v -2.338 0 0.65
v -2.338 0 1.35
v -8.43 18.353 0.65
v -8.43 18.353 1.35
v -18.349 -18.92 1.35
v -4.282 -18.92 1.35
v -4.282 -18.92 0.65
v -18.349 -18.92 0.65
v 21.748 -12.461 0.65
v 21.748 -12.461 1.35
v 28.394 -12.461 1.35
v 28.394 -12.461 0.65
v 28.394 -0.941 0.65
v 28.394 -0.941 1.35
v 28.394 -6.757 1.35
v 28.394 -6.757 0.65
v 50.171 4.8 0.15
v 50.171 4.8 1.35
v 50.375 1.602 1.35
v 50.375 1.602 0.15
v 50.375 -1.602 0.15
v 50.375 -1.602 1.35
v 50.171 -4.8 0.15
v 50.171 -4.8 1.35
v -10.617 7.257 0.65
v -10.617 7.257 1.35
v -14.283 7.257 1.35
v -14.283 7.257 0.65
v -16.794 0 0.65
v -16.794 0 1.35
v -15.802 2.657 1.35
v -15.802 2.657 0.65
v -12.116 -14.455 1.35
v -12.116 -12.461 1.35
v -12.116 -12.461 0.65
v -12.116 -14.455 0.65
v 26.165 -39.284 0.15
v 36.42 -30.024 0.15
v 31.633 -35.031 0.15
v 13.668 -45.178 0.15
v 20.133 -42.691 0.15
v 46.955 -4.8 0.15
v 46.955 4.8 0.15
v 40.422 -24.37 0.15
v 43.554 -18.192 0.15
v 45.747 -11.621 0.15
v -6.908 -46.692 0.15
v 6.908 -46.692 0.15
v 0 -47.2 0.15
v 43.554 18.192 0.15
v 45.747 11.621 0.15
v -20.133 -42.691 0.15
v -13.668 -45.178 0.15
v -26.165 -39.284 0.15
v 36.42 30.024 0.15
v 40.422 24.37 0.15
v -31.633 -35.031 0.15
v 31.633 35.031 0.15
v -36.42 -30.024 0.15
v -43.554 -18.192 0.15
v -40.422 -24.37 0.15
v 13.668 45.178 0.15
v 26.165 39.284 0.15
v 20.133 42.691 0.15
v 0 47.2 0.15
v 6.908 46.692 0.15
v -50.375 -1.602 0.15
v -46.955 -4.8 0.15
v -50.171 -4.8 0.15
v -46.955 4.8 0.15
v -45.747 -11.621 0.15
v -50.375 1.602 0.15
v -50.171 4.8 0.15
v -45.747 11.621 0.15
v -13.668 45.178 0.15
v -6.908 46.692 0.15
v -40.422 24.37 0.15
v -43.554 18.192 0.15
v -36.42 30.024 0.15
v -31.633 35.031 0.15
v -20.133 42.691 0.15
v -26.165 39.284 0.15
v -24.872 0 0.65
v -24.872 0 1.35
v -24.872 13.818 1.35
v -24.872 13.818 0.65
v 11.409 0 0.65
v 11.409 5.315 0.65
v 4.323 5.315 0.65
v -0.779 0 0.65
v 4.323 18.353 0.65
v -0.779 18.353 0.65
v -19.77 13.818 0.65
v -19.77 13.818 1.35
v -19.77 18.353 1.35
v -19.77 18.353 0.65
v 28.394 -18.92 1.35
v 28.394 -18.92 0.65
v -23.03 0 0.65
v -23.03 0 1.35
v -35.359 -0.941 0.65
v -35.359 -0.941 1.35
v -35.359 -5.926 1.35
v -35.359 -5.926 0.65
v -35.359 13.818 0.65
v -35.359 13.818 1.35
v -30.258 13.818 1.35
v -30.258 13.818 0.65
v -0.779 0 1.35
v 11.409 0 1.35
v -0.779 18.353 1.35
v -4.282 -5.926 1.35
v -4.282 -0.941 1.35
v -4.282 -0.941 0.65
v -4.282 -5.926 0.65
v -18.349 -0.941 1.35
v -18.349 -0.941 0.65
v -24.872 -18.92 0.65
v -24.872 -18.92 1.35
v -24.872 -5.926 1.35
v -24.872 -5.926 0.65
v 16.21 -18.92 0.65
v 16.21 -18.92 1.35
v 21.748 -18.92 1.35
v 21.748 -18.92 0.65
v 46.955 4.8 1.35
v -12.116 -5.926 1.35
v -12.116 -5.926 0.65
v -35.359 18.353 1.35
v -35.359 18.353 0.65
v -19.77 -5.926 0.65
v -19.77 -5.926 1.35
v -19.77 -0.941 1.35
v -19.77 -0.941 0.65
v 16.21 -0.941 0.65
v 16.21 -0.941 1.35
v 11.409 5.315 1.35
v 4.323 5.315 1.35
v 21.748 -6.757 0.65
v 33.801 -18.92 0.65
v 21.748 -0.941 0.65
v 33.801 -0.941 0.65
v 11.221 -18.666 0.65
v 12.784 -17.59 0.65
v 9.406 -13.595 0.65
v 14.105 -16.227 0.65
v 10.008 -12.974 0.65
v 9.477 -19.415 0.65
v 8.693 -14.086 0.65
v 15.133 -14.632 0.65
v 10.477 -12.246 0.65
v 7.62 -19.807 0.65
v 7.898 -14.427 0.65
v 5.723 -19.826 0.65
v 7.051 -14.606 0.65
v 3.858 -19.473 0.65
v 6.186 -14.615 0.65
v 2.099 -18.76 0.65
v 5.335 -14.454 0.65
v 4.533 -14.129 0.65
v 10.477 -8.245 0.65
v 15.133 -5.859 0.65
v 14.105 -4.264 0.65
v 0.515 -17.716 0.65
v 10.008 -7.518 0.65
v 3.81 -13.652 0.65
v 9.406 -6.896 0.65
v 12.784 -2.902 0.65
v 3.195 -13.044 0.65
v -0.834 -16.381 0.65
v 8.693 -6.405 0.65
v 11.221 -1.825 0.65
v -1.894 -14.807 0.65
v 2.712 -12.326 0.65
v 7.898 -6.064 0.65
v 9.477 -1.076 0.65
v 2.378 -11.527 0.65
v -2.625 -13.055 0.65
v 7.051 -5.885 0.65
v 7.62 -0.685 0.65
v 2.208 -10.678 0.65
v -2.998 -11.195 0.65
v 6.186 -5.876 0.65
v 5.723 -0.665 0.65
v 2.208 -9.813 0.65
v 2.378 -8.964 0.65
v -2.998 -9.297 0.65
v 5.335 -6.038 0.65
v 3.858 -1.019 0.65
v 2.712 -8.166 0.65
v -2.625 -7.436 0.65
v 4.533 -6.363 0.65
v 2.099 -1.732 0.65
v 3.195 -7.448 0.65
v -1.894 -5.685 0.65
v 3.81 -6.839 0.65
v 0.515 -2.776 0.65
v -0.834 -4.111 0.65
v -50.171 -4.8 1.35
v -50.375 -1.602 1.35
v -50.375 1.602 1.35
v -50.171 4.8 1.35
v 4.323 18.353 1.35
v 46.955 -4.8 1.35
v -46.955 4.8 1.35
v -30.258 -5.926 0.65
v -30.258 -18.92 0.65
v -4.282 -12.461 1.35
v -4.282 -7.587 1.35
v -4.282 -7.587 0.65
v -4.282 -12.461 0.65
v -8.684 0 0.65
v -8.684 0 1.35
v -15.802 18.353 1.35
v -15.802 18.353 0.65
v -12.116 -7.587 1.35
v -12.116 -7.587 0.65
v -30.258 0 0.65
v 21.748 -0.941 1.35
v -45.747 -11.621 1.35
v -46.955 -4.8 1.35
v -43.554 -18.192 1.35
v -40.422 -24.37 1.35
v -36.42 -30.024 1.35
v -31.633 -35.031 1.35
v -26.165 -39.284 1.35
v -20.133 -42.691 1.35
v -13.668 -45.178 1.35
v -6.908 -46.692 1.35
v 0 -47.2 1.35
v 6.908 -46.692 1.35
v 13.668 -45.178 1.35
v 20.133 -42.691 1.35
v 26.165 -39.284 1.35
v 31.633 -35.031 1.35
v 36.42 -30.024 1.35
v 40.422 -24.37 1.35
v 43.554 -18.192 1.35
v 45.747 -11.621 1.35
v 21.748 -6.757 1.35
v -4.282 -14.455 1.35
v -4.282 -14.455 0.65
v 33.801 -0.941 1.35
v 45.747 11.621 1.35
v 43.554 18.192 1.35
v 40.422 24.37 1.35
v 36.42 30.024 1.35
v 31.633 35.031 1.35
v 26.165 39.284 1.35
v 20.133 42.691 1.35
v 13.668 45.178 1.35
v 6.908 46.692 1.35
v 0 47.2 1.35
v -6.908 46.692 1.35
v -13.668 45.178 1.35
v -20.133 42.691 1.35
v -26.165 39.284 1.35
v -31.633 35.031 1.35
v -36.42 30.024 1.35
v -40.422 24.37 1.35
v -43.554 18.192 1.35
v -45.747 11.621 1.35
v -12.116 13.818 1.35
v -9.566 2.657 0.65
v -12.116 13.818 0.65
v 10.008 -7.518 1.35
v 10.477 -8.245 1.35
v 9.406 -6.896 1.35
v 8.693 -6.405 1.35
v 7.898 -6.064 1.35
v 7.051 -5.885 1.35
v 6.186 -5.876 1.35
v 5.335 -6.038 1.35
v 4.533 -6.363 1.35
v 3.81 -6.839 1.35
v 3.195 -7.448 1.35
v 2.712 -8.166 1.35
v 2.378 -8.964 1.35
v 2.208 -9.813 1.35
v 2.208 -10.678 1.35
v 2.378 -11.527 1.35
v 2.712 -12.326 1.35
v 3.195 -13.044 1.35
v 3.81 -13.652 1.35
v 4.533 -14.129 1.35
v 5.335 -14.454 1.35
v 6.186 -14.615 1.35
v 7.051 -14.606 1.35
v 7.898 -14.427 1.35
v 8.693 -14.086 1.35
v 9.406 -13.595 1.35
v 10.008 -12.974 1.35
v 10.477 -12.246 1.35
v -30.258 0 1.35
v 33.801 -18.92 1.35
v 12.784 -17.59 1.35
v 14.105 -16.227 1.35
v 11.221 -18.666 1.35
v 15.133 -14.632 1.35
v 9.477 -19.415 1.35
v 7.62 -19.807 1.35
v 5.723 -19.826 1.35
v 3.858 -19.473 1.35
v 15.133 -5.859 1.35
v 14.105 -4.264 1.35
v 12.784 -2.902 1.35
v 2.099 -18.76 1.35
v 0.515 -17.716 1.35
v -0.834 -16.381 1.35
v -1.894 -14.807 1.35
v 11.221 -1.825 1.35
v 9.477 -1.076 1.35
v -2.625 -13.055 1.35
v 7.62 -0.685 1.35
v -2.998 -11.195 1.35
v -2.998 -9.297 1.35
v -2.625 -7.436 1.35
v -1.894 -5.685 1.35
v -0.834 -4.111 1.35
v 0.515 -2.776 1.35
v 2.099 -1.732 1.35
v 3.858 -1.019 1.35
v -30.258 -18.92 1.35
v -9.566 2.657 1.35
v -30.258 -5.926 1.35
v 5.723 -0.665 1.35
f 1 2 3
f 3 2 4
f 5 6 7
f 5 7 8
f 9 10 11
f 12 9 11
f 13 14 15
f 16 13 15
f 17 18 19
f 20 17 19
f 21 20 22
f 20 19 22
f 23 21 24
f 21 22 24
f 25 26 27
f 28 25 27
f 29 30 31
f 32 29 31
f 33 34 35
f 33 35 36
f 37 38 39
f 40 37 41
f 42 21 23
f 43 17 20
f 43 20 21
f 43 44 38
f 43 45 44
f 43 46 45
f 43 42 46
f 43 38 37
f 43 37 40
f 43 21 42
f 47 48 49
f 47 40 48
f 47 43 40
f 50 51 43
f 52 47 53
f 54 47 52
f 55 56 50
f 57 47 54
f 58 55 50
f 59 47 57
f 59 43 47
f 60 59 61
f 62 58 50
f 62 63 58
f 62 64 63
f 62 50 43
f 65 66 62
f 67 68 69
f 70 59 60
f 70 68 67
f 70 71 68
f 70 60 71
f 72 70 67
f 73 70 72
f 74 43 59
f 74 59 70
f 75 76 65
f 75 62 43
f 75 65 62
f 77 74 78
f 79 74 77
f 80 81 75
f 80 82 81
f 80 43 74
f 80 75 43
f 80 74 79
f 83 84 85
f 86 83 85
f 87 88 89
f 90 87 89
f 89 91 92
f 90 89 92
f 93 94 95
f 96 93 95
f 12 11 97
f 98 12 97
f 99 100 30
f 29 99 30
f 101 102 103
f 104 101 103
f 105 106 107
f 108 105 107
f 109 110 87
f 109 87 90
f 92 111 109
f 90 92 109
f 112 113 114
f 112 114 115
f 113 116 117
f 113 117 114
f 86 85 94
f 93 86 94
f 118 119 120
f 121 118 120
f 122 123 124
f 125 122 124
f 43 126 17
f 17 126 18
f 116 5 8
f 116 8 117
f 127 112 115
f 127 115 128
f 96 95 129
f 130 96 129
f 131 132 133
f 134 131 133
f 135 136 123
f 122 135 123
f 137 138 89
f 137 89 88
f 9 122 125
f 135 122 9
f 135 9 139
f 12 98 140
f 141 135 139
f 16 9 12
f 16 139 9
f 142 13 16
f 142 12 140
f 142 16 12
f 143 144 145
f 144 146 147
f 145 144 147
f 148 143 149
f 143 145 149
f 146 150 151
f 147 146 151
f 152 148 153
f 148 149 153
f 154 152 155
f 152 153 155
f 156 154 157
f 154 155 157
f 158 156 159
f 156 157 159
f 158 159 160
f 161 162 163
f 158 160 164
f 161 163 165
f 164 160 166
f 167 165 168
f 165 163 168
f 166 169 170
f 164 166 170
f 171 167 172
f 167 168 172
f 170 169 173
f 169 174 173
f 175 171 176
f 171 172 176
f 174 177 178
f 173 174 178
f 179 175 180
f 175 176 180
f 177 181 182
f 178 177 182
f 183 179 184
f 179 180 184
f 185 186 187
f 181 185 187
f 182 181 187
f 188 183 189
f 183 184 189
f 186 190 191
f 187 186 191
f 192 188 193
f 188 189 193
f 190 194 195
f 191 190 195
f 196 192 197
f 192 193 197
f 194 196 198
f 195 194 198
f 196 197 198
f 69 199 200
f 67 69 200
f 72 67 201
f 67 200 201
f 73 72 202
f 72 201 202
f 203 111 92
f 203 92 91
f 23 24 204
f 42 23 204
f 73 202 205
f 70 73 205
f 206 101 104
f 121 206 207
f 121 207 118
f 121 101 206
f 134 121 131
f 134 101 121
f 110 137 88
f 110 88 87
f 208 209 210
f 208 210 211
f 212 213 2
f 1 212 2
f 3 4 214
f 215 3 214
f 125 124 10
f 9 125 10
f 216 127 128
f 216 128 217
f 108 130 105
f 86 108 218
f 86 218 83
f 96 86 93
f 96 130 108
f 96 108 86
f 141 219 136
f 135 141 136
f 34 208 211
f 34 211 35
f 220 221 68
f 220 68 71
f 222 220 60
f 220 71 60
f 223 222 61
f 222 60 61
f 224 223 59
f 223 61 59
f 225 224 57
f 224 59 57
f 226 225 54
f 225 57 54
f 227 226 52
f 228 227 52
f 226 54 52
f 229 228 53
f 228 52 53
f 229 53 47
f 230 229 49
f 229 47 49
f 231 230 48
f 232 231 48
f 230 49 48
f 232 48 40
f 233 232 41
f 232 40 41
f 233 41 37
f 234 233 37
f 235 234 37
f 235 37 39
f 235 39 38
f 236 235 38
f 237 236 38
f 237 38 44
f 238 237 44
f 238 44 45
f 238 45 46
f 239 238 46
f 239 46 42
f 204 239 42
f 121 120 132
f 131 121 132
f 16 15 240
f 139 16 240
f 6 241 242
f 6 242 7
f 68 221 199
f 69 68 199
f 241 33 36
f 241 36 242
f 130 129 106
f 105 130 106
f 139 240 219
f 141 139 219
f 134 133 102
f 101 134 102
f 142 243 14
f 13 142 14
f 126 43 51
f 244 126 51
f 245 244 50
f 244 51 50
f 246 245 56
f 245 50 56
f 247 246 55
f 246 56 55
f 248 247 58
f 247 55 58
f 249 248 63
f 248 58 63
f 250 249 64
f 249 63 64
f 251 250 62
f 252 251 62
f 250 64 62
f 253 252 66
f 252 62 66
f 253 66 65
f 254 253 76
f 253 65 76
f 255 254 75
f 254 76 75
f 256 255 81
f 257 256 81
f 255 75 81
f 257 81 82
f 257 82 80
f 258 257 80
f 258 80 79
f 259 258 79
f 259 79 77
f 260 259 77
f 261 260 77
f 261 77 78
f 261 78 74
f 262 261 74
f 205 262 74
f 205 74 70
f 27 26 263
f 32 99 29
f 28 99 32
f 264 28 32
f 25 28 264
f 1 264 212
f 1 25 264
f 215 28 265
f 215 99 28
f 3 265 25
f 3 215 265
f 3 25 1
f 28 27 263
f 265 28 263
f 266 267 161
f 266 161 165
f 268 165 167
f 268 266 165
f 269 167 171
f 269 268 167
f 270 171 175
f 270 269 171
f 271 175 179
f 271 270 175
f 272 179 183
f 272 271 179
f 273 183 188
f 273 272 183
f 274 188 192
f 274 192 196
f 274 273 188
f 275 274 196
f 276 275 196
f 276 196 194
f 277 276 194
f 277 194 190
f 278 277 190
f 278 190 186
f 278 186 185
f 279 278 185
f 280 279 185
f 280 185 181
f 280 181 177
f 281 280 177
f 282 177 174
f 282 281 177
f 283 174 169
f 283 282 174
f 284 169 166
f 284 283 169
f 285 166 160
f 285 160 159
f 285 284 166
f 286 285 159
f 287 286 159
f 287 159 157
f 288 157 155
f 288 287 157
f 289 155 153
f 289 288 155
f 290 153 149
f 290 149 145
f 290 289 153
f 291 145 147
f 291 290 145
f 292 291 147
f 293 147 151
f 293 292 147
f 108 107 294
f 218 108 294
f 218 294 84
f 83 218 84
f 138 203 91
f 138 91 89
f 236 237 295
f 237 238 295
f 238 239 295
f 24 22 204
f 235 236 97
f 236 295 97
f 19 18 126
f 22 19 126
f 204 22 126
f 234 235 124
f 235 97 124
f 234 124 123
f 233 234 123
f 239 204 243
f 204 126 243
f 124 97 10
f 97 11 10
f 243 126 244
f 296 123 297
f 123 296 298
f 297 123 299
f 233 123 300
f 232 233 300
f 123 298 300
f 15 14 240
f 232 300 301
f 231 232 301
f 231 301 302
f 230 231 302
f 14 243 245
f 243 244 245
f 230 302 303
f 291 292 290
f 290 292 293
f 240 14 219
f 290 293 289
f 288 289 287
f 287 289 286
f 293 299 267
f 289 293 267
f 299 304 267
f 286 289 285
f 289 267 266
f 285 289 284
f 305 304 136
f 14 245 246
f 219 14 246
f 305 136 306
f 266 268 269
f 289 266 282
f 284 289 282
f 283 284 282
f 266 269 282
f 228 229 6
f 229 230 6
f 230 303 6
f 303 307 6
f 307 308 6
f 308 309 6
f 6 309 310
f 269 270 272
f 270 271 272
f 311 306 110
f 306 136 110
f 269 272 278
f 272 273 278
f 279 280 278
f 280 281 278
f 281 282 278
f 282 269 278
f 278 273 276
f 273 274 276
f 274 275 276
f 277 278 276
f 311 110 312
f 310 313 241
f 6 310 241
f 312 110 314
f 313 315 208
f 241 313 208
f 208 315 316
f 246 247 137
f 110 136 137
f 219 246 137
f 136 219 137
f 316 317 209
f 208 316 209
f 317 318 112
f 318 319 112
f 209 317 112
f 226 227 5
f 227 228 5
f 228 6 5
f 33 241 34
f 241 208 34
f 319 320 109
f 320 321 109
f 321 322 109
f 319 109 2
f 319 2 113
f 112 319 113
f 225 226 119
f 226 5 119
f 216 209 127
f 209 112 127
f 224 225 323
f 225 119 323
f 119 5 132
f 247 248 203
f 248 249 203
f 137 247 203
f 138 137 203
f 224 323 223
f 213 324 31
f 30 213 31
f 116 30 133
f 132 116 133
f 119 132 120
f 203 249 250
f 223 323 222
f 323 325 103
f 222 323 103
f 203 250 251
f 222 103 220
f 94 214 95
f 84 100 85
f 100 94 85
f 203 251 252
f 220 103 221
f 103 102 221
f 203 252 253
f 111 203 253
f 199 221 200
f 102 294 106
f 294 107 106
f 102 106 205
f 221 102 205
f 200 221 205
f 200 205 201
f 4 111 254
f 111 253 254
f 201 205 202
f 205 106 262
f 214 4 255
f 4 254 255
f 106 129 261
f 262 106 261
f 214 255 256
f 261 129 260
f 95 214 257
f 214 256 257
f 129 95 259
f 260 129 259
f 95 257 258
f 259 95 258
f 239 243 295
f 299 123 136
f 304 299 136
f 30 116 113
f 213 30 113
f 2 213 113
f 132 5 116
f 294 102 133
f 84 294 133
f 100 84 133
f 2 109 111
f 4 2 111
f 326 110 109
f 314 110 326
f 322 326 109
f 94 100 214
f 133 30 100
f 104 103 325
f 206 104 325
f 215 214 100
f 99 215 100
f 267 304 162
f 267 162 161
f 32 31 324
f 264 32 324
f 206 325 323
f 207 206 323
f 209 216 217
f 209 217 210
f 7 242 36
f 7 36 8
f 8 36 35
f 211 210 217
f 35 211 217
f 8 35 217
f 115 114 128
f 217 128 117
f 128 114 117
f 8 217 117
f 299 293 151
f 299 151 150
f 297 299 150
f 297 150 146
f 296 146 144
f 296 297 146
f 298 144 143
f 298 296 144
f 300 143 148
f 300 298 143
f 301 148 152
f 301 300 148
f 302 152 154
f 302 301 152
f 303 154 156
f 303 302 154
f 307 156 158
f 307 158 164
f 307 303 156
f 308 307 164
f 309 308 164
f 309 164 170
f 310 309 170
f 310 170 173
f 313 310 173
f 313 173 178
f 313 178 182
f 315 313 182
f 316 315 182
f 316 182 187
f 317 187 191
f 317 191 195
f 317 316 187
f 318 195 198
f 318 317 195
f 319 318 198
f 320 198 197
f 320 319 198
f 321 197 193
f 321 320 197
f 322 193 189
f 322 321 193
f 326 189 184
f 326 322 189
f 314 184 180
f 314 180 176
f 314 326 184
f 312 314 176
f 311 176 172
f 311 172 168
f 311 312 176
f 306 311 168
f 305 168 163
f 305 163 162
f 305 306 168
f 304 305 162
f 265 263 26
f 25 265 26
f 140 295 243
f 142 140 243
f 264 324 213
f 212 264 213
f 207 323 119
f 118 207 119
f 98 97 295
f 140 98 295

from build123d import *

# Parameters (mm, degrees)
CROQUIS1_R              = 59
SALIENTE_EXTRUIR1_DEPTH = 1.5
SALIENTE_EXTRUIR2_DEPTH = 1.5
ESCALA1_SCALE           = 0.8
CORTAR_EXTRUIR1_DEPTH   = 0.7


with BuildPart() as part:
    # Croquis1 → Saliente-Extruir1 (new body)
    with BuildSketch(Plane.XY):
        Circle(CROQUIS1_R)
    extrude(amount=SALIENTE_EXTRUIR1_DEPTH)

    # Croquis2 → Saliente-Extruir2 (add)
    with BuildSketch(Plane.XY.offset(1.5)):
        with BuildLine():
            Line((-62.713634881, 6), (62.713634881, 6))
            ThreePointArc((62.713634881, 6), (63, 0), (62.713634881, -6))
            Line((62.713634881, -6), (-62.713634881, -6))
            ThreePointArc((-62.713634881, -6), (-63, 0), (-62.713634881, 6))
        make_face()
    extrude(amount=-SALIENTE_EXTRUIR2_DEPTH)


with BuildPart() as part_1:
    # Escala1: scaled about (0, 0, 0.75)
    add(part.part.scale(ESCALA1_SCALE).moved(Location((0, 0, 0.15))))

    # Croquis7 → Cortar-Extruir1 (cut)
    with BuildSketch(Plane.XY.offset(1.35)):
        Polygon((-0.779467376, 0), (-0.779467376, 5.314550288), (-0.779467376, 18.352913661), (4.322500901, 18.352913661), (4.322500901, 5.314550288), (11.408567952, 5.314550288), (11.408567952, 0), align=None)
        Polygon((-15.801929523, 18.352913661), (-23.029717915, 0), (-16.79397891, 0), (-15.801929523, 2.657275144), (-9.566190518, 2.657275144), (-8.684228244, 0), (-2.338402127, 0), (-8.429821566, 18.352913661), align=None)
        Polygon((-10.617093295, 7.257317405), (-14.282649957, 7.257317405), (-12.115875544, 13.817830749), align=None, mode=Mode.SUBTRACT)
        Polygon((-24.872095348, 0), (-24.872095348, 13.817830749), (-19.770127071, 13.817830749), (-19.770127071, 18.352913661), (-35.359474583, 18.352913661), (-35.359474583, 13.817830749), (-30.257506306, 13.817830749), (-30.257506306, 0), align=None)
        Polygon((-24.872095348, -18.919799025), (-24.872095348, -5.925877823), (-19.770127071, -5.925877823), (-19.770127071, -0.941442838), (-35.359474583, -0.941442838), (-35.359474583, -5.925877823), (-30.257506306, -5.925877823), (-30.257506306, -18.919799025), align=None)
        Polygon((-4.281500949, -14.454799909), (-4.281500949, -18.919799025), (-18.34868413, -18.919799025), (-18.34868413, -0.941442838), (-4.281500949, -0.941442838), (-4.281500949, -5.925877823), (-12.115875544, -5.925877823), (-12.115875544, -7.587356151), (-4.281500949, -7.587356151), (-4.281500949, -12.461025915), (-12.115875544, -12.461025915), (-12.115875544, -14.454799909), align=None)
        with BuildLine():
            ThreePointArc((10.477188742, -8.24524686), (2.187062141, -10.245721477), (10.477188742, -12.246196094))
            Line((10.477188742, -12.246196094), (15.133105793, -14.632150132))
            ThreePointArc((15.133105793, -14.632150132), (-3.044604921, -10.245721477), (15.133105793, -5.859292822))
            Line((15.133105793, -5.859292822), (10.477188742, -8.24524686))
        make_face()
        Polygon((28.394239509, -12.461025915), (28.394239509, -18.919799025), (33.800539832, -18.919799025), (33.800539832, -0.941442838), (28.394239509, -0.941442838), (28.394239509, -6.756616987), (21.748326196, -6.756616987), (21.748326196, -0.941442838), (16.210065101, -0.941442838), (16.210065101, -18.919799025), (21.748326196, -18.919799025), (21.748326196, -12.461025915), align=None)
    extrude(amount=-CORTAR_EXTRUIR1_DEPTH, mode=Mode.SUBTRACT)


solid = part_1.part
